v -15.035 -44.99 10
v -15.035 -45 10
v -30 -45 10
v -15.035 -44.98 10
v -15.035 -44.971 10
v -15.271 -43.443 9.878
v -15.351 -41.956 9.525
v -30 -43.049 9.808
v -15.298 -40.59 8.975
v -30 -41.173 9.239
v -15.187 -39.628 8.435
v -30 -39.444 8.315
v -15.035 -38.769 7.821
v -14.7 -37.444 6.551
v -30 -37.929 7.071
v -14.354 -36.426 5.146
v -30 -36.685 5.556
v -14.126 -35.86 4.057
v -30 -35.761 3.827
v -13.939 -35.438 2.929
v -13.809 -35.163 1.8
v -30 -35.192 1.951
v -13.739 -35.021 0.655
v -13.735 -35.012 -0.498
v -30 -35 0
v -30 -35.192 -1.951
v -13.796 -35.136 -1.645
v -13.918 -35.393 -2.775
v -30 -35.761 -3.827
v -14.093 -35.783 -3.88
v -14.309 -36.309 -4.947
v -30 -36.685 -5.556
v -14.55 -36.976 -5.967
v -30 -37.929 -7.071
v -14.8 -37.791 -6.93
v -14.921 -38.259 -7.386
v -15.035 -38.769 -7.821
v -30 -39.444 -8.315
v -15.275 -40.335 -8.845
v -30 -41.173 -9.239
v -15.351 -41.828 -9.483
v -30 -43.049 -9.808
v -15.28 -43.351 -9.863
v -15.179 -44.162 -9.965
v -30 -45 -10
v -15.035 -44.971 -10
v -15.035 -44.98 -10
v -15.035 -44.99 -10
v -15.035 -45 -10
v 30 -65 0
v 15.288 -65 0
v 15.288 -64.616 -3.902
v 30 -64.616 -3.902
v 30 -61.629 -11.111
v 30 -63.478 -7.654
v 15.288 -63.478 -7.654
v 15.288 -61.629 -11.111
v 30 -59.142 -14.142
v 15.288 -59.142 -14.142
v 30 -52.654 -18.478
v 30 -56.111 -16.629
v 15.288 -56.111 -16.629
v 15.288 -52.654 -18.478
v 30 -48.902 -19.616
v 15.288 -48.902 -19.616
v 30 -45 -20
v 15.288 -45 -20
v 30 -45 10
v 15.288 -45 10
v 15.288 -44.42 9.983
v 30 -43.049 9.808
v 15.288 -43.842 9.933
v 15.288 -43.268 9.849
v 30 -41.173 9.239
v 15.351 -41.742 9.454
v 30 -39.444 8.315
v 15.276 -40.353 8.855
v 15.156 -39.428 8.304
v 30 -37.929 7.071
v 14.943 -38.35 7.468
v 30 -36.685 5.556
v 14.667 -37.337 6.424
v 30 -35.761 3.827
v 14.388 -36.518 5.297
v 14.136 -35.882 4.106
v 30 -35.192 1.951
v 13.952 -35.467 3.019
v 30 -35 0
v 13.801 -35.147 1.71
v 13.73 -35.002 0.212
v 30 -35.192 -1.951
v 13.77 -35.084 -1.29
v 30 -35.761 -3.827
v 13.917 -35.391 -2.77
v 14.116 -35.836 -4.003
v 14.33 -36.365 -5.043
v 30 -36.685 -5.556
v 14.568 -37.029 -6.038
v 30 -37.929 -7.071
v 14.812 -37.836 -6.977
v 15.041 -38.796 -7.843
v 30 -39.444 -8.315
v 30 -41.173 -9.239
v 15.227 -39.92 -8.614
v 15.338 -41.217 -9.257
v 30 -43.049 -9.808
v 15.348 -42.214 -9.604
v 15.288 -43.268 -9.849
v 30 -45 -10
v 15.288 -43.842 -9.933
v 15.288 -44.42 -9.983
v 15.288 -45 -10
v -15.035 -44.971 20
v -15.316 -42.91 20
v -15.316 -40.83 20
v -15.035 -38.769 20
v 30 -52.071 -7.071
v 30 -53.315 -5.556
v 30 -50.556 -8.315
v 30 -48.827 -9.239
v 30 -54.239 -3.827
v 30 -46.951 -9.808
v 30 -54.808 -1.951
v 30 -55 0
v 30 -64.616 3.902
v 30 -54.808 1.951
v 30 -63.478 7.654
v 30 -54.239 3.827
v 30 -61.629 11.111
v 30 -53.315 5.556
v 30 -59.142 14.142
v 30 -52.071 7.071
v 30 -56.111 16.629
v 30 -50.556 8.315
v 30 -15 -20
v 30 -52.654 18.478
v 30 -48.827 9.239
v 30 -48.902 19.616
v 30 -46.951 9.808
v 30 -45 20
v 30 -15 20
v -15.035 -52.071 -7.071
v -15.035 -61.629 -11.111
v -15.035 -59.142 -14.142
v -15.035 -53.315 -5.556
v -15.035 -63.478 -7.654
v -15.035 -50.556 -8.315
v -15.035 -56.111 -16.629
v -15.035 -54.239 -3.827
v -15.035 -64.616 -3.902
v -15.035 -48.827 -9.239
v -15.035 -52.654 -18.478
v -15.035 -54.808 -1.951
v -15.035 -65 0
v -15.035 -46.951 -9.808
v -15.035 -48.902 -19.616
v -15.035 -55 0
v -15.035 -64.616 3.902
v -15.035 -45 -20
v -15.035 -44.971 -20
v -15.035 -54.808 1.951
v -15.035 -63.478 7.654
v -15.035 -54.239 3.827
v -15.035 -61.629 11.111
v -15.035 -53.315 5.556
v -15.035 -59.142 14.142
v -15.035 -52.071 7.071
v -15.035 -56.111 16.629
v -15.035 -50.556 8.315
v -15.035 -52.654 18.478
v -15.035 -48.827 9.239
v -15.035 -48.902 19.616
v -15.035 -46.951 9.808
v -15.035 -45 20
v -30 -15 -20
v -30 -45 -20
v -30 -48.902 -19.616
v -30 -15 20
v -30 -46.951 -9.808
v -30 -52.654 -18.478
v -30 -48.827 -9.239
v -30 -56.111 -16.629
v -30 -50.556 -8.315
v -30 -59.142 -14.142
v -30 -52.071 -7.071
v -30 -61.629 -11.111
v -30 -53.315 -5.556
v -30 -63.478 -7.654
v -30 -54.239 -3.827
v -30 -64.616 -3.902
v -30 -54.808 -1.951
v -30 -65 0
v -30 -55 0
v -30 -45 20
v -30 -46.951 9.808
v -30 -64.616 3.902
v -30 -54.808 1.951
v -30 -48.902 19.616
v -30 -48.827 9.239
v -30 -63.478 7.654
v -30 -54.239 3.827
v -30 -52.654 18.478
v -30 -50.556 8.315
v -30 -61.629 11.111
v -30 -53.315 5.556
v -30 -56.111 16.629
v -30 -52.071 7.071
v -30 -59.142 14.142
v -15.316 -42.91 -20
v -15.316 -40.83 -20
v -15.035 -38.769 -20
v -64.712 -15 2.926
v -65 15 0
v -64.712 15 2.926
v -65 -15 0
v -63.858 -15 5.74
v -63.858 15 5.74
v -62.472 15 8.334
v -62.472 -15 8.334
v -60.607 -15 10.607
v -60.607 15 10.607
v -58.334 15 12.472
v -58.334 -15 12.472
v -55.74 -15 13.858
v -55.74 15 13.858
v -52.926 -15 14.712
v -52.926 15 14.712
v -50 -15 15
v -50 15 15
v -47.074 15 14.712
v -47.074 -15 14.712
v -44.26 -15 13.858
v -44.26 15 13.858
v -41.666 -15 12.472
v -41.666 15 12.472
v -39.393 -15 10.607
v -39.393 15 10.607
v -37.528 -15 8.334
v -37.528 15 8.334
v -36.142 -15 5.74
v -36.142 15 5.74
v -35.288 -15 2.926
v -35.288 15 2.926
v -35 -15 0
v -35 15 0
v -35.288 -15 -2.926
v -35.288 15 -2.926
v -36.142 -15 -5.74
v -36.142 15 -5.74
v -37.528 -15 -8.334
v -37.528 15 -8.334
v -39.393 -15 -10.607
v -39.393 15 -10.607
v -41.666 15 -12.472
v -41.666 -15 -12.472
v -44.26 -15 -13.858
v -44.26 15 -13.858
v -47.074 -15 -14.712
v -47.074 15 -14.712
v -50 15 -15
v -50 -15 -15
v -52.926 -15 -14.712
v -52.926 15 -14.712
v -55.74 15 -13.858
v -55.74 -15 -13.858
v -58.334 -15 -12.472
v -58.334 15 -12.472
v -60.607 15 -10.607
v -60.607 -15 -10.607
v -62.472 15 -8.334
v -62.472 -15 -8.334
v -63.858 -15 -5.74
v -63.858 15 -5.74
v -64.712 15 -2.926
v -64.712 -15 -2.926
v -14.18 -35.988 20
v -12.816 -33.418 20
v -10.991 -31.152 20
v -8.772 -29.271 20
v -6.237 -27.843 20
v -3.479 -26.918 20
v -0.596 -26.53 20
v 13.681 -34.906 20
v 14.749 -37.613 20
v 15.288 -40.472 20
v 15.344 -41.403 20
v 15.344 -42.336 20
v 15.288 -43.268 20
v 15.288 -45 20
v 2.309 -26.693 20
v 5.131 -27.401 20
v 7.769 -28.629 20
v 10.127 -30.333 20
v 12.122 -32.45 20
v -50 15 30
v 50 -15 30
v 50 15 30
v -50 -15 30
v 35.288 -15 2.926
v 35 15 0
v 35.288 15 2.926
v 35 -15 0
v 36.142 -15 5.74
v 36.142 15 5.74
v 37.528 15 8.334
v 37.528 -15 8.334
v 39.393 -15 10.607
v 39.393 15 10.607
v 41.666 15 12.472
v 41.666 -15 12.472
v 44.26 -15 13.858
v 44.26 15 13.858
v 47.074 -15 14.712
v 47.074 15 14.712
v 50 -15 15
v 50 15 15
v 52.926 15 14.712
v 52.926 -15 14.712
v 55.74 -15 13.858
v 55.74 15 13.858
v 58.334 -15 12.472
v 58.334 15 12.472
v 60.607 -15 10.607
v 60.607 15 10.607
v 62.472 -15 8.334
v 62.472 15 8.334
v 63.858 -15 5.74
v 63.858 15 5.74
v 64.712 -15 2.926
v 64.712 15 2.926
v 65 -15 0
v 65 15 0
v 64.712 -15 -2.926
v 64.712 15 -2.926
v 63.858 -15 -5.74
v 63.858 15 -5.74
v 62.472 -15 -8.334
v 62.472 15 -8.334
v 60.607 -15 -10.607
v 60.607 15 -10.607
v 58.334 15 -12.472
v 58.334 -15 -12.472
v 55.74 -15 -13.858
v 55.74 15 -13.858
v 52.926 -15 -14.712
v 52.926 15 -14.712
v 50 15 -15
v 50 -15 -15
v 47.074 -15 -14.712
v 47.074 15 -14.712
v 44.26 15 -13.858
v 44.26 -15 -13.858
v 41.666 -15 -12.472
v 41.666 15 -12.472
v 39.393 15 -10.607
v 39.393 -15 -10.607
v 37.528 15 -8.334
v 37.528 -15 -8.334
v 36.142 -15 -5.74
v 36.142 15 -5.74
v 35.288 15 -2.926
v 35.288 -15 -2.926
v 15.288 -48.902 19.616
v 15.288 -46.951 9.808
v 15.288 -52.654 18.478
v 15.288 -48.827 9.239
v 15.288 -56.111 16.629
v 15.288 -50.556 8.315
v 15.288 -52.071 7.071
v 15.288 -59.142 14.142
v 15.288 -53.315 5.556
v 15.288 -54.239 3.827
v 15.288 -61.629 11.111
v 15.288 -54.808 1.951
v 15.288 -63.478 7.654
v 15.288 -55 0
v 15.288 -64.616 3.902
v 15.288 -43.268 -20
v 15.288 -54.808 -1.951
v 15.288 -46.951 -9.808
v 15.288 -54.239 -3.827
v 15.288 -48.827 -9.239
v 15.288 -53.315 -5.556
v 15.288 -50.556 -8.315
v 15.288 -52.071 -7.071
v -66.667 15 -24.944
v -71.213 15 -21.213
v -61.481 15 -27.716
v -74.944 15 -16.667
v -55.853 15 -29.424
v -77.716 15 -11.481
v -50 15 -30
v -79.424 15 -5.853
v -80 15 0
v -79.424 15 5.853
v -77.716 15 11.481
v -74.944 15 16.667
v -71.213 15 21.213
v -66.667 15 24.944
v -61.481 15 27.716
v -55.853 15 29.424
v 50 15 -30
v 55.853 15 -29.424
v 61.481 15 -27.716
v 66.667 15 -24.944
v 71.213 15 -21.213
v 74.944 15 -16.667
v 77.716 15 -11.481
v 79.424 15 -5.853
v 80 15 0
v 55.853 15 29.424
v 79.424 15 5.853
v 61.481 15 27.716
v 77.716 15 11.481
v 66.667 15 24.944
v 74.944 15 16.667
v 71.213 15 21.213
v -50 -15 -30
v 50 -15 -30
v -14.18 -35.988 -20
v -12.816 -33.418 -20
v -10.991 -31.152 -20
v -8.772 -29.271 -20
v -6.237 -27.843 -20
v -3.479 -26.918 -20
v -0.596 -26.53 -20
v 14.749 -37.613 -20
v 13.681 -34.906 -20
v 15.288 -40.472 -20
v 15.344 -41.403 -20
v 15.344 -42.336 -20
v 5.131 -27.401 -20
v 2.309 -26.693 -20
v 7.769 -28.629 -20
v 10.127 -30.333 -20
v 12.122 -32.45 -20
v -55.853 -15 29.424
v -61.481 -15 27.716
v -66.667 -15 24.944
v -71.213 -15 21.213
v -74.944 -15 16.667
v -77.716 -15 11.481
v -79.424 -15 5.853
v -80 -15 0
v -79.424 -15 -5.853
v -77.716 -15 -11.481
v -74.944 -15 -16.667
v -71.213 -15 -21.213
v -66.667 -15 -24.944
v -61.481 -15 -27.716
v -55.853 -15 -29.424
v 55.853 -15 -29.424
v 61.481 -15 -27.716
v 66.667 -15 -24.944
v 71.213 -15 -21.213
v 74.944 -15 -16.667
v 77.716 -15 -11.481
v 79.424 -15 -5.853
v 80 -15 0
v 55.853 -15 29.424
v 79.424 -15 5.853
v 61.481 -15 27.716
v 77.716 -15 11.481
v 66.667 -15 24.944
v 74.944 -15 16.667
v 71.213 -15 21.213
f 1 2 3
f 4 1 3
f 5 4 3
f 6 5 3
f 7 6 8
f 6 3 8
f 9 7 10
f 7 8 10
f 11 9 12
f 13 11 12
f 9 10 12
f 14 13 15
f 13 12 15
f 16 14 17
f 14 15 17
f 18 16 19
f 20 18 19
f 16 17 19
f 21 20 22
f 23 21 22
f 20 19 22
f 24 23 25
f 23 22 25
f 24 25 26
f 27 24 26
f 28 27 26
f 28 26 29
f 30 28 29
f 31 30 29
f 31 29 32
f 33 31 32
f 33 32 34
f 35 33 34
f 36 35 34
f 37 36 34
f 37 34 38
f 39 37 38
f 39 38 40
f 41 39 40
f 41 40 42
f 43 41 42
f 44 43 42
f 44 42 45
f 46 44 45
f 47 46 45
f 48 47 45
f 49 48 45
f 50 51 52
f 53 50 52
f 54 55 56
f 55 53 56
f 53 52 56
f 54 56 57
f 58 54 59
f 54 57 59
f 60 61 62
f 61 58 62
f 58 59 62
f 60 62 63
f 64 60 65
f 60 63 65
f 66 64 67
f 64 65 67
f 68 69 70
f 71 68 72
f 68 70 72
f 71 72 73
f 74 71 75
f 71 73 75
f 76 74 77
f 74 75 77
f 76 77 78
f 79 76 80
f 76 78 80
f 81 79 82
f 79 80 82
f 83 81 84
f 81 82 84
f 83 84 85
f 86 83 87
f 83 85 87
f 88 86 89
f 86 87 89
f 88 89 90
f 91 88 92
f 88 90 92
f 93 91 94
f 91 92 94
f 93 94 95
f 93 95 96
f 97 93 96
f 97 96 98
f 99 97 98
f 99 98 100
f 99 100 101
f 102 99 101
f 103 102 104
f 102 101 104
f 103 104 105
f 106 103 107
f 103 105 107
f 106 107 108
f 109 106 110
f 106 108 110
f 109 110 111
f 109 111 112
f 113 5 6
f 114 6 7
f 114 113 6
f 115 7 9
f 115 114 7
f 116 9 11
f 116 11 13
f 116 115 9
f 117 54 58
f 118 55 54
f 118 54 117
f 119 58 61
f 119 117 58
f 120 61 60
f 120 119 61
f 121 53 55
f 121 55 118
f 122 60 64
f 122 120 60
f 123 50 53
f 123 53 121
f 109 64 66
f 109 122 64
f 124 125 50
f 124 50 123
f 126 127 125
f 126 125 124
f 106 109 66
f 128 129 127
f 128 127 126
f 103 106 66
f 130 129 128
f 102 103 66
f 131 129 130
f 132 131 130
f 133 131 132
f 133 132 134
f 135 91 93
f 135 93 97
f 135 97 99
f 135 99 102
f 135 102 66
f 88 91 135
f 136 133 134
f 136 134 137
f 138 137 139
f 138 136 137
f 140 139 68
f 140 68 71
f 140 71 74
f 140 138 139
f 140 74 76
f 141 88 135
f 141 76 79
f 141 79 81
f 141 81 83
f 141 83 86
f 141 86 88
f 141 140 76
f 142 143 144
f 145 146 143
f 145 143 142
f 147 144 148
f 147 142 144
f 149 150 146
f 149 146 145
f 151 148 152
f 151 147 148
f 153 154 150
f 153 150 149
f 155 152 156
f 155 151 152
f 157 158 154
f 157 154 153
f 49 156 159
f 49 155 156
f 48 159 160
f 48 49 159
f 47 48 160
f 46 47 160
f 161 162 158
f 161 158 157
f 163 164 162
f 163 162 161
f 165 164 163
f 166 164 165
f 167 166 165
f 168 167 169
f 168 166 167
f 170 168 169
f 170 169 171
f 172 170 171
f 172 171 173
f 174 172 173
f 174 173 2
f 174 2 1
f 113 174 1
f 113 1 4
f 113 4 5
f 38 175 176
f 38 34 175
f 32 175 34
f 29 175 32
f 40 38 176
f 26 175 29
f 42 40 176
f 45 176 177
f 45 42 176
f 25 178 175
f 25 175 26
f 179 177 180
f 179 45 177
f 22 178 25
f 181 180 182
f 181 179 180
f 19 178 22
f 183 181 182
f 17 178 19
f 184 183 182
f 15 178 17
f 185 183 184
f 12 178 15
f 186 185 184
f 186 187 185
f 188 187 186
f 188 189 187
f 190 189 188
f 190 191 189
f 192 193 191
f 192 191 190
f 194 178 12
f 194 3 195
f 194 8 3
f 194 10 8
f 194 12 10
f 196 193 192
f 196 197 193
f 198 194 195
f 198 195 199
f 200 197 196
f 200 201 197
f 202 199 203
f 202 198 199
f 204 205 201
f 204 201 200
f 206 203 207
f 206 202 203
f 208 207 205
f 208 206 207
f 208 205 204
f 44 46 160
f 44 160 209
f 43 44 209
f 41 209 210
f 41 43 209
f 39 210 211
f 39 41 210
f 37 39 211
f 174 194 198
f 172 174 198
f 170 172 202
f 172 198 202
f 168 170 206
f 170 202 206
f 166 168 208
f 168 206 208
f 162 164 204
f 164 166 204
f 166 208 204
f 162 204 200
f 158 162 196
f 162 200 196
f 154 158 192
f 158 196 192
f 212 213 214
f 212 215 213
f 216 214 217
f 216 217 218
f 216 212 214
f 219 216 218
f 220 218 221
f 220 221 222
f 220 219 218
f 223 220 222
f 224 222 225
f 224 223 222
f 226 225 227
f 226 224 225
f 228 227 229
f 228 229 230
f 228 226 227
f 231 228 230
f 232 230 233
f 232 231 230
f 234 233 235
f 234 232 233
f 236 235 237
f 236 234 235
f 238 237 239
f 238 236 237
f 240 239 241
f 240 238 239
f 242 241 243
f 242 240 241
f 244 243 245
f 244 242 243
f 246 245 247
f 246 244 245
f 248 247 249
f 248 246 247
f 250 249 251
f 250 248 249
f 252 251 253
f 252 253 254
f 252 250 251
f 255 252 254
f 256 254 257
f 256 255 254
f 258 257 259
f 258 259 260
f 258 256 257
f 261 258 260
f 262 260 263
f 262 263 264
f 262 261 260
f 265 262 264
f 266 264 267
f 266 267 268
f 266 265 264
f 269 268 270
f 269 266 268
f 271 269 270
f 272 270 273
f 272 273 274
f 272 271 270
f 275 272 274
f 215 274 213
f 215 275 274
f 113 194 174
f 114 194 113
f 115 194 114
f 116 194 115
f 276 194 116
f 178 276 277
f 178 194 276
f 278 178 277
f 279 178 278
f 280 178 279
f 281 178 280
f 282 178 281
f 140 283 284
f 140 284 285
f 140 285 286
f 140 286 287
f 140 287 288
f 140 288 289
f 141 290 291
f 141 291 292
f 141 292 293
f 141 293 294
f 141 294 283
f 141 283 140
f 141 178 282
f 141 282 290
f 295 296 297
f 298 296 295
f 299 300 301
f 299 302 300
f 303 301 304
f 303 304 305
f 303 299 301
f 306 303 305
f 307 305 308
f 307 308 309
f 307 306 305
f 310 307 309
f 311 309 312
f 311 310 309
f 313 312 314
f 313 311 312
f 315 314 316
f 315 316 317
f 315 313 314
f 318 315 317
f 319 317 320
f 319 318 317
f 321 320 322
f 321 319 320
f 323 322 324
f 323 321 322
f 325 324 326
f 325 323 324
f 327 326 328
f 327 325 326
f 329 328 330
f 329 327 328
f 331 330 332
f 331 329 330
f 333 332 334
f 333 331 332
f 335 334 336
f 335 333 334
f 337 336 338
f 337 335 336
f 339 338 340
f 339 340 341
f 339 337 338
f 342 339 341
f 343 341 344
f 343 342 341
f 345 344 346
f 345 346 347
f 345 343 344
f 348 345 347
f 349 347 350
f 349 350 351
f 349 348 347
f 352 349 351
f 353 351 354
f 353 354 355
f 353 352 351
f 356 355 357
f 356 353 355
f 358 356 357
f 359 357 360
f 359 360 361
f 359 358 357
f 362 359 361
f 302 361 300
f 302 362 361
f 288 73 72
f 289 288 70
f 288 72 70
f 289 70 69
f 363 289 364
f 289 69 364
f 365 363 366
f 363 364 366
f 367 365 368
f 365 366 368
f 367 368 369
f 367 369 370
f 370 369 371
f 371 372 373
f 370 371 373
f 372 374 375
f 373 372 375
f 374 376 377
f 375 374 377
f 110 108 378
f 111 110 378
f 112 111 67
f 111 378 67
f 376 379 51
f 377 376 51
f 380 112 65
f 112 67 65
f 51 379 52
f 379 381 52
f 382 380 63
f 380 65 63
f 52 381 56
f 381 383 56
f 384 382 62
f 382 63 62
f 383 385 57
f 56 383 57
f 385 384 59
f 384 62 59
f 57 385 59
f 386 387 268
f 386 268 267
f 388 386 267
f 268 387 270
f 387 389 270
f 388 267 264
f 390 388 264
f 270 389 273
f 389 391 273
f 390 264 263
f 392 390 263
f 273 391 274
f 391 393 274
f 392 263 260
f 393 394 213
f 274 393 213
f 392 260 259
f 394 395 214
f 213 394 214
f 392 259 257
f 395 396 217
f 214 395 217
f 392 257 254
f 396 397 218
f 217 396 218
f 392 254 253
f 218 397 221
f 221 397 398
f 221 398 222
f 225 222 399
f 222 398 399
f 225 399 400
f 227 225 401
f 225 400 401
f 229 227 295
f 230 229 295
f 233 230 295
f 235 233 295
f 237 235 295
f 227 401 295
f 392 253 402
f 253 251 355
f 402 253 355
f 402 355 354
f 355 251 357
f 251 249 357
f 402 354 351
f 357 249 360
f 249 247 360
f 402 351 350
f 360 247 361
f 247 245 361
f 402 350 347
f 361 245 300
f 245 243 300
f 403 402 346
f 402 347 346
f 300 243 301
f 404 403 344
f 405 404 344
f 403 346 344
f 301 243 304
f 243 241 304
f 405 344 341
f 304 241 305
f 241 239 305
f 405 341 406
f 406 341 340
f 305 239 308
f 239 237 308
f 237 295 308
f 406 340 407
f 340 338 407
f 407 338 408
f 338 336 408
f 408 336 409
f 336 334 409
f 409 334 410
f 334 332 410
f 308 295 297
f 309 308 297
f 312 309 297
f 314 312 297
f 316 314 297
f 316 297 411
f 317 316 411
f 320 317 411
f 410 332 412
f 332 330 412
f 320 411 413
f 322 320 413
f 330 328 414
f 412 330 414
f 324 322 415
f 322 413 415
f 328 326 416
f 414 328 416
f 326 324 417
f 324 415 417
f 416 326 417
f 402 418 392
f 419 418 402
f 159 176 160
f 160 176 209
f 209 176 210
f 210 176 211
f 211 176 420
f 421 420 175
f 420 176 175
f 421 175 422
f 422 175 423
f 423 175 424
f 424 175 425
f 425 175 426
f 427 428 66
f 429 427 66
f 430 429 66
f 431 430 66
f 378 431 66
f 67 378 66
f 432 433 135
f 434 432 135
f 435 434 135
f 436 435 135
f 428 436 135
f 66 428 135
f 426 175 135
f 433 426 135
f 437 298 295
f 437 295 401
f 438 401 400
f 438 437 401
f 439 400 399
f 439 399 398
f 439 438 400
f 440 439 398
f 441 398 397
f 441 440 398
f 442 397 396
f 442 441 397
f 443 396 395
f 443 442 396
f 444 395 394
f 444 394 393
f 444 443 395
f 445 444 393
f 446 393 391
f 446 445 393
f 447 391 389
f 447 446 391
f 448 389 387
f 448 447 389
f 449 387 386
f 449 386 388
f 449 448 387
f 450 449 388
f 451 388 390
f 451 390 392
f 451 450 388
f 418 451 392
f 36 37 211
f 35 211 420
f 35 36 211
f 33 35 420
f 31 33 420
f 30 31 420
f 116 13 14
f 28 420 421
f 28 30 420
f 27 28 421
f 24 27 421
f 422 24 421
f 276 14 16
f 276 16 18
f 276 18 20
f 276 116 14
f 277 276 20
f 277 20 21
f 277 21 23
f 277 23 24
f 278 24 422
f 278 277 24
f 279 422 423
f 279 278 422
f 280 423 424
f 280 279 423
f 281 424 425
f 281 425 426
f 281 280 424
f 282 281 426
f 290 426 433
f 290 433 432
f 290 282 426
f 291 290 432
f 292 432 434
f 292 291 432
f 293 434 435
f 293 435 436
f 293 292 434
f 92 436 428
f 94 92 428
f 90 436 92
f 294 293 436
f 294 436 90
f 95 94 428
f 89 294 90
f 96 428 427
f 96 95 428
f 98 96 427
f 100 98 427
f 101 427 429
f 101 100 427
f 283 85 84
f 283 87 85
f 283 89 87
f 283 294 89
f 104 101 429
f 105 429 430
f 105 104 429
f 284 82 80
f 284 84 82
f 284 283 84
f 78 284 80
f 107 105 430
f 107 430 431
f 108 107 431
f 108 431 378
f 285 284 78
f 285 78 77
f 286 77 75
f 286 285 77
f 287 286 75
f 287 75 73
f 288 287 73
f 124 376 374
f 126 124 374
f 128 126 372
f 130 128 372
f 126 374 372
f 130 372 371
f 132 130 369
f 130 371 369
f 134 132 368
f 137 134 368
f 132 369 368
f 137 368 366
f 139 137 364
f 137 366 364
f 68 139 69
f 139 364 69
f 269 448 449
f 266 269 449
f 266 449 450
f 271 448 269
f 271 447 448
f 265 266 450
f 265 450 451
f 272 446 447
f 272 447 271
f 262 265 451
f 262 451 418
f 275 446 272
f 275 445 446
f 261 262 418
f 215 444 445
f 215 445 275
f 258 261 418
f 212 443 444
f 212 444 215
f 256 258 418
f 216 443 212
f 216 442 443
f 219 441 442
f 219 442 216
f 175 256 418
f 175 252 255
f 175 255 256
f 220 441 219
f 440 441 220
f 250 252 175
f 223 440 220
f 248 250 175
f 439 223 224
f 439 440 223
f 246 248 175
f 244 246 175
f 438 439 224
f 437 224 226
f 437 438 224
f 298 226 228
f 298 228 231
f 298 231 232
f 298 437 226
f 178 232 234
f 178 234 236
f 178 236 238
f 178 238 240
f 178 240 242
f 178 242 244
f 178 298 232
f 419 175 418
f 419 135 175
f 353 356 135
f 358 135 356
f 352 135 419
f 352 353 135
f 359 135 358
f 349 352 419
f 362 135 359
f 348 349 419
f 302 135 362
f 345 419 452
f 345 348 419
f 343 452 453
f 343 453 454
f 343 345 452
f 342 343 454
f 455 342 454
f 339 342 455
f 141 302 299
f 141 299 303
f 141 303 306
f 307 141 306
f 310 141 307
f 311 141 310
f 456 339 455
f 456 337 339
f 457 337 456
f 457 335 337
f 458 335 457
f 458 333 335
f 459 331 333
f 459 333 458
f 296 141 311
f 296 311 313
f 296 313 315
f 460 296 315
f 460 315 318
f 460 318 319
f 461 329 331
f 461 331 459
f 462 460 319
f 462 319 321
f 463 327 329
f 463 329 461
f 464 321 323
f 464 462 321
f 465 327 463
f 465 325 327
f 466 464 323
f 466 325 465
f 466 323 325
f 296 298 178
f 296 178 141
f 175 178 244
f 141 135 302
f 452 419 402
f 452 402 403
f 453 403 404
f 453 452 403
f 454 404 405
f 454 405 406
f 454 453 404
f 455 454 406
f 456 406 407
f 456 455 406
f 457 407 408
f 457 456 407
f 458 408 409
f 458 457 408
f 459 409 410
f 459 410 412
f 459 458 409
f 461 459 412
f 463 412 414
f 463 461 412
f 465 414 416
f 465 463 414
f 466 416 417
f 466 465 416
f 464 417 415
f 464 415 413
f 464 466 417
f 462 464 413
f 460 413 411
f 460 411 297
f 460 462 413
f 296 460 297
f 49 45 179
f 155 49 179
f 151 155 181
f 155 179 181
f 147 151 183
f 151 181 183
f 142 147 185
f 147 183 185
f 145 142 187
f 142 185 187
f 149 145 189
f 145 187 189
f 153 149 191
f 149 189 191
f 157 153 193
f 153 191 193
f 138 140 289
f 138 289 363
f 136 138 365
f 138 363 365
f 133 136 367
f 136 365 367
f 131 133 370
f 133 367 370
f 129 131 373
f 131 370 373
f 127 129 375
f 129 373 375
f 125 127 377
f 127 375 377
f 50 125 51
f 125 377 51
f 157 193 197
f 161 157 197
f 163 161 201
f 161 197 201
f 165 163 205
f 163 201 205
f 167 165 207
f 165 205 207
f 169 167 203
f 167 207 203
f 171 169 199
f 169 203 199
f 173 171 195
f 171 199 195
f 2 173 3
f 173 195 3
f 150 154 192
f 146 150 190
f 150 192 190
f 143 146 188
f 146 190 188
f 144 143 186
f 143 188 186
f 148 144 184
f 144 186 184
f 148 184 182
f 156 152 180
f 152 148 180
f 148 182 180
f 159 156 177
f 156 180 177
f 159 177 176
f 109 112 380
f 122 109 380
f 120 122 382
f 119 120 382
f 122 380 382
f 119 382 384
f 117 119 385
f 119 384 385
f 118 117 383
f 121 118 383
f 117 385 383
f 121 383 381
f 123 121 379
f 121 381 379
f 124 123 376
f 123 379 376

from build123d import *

# Parameters (mm, degrees)
F1_DEPTH = 15
F3_DEPTH = 20
F5_DEPTH = 110.001
F7_DEPTH = 110.001


with BuildPart() as f1:
    # F0 (on Front) → F1 (new body, symmetric)
    with BuildSketch(Plane.XZ):
        with BuildLine():
            Line((35, 0), (-35, 0))
            ThreePointArc((-35, 0), (-50, -15), (-65, 0))
            Line((-65, 0), (-80, 0))
            ThreePointArc((-80, 0), (-71.2132034356, -21.2132034356), (-50, -30))
            Line((-50, -30), (50, -30))
            ThreePointArc((50, -30), (71.2132034356, -21.2132034356), (80, 0))
            Line((80, 0), (65, 0))
            ThreePointArc((65, 0), (50, -15), (35, 0))
        make_face()
        with BuildLine():
            ThreePointArc((-65, 0), (-50, 15), (-35, 0))
            Line((-35, 0), (35, 0))
            ThreePointArc((35, 0), (50, 15), (65, 0))
            Line((65, 0), (80, 0))
            ThreePointArc((80, 0), (71.2132034356, 21.2132034356), (50, 30))
            Line((50, 30), (-50, 30))
            ThreePointArc((-50, 30), (-71.2132034356, 21.2132034356), (-80, 0))
            Line((-80, 0), (-65, 0))
        make_face()
    extrude(amount=F1_DEPTH, both=True)

    # F2 (on Top) → F3 (join, symmetric)
    with BuildSketch(Plane.XY):
        with BuildLine():
            Line((-30, -15), (-30, -65))
            Line((-30, -65), (-15.0350227241, -65))
            Line((-15.0350227241, -65), (-15.0350227241, -44.9706647246))
            ThreePointArc((-15.0350227241, -44.9706647246), (-15.3514603972, -41.869789362), (-15.0350227241, -38.7689139994))
            ThreePointArc((-15.0350227241, -38.7689139994), (0.8607482539, -26.5424788095), (15.2876708067, -40.4717701802))
            ThreePointArc((15.2876708067, -40.4717701802), (15.3514603972, -41.869789362), (15.2876708067, -43.2678085437))
            Line((15.2876708067, -43.2678085437), (15.2876708067, -65))
            Line((15.2876708067, -65), (30, -65))
            Line((30, -65), (30, -15))
            Line((30, -15), (-30, -15))
        make_face()
    extrude(amount=F3_DEPTH, both=True)

    # F4 (on face) → F5 (cut, through all)
    with BuildSketch(Plane(origin=(-30, 0, 0), x_dir=(0, -1, 0), z_dir=(-1, 0, 0))):
        with BuildLine():
            Line((65, 20), (45, 20))
            ThreePointArc((45, 20), (59.1421356638, 14.1421355837), (65, -1.132e-07))
            Line((65, -1.132e-07), (65, 20))
        make_face()
        with BuildLine():
            ThreePointArc((65, -1.132e-07), (59.1421355837, -14.1421356638), (45, -20))
            Line((45, -20), (65, -20))
            Line((65, -20), (65, -1.132e-07))
        make_face()
    extrude(amount=-F5_DEPTH, mode=Mode.SUBTRACT)

    # F6 (on face) → F7 (cut, through all)
    with BuildSketch(Plane(origin=(-30, 0, 0), x_dir=(0, -1, 0), z_dir=(-1, 0, 0))):
        with BuildLine():
            ThreePointArc((55, 0), (52.0710678119, 7.0710678119), (45, 10))
            Line((45, 10), (45, -10))
            ThreePointArc((45, -10), (52.0710678119, -7.0710678119), (55, 0))
        make_face()
        with BuildLine():
            Line((45, -10), (45, 10))
            ThreePointArc((45, 10), (35, 0), (45, -10))
        make_face()
    extrude(amount=-F7_DEPTH, mode=Mode.SUBTRACT)


solid = f1.part
